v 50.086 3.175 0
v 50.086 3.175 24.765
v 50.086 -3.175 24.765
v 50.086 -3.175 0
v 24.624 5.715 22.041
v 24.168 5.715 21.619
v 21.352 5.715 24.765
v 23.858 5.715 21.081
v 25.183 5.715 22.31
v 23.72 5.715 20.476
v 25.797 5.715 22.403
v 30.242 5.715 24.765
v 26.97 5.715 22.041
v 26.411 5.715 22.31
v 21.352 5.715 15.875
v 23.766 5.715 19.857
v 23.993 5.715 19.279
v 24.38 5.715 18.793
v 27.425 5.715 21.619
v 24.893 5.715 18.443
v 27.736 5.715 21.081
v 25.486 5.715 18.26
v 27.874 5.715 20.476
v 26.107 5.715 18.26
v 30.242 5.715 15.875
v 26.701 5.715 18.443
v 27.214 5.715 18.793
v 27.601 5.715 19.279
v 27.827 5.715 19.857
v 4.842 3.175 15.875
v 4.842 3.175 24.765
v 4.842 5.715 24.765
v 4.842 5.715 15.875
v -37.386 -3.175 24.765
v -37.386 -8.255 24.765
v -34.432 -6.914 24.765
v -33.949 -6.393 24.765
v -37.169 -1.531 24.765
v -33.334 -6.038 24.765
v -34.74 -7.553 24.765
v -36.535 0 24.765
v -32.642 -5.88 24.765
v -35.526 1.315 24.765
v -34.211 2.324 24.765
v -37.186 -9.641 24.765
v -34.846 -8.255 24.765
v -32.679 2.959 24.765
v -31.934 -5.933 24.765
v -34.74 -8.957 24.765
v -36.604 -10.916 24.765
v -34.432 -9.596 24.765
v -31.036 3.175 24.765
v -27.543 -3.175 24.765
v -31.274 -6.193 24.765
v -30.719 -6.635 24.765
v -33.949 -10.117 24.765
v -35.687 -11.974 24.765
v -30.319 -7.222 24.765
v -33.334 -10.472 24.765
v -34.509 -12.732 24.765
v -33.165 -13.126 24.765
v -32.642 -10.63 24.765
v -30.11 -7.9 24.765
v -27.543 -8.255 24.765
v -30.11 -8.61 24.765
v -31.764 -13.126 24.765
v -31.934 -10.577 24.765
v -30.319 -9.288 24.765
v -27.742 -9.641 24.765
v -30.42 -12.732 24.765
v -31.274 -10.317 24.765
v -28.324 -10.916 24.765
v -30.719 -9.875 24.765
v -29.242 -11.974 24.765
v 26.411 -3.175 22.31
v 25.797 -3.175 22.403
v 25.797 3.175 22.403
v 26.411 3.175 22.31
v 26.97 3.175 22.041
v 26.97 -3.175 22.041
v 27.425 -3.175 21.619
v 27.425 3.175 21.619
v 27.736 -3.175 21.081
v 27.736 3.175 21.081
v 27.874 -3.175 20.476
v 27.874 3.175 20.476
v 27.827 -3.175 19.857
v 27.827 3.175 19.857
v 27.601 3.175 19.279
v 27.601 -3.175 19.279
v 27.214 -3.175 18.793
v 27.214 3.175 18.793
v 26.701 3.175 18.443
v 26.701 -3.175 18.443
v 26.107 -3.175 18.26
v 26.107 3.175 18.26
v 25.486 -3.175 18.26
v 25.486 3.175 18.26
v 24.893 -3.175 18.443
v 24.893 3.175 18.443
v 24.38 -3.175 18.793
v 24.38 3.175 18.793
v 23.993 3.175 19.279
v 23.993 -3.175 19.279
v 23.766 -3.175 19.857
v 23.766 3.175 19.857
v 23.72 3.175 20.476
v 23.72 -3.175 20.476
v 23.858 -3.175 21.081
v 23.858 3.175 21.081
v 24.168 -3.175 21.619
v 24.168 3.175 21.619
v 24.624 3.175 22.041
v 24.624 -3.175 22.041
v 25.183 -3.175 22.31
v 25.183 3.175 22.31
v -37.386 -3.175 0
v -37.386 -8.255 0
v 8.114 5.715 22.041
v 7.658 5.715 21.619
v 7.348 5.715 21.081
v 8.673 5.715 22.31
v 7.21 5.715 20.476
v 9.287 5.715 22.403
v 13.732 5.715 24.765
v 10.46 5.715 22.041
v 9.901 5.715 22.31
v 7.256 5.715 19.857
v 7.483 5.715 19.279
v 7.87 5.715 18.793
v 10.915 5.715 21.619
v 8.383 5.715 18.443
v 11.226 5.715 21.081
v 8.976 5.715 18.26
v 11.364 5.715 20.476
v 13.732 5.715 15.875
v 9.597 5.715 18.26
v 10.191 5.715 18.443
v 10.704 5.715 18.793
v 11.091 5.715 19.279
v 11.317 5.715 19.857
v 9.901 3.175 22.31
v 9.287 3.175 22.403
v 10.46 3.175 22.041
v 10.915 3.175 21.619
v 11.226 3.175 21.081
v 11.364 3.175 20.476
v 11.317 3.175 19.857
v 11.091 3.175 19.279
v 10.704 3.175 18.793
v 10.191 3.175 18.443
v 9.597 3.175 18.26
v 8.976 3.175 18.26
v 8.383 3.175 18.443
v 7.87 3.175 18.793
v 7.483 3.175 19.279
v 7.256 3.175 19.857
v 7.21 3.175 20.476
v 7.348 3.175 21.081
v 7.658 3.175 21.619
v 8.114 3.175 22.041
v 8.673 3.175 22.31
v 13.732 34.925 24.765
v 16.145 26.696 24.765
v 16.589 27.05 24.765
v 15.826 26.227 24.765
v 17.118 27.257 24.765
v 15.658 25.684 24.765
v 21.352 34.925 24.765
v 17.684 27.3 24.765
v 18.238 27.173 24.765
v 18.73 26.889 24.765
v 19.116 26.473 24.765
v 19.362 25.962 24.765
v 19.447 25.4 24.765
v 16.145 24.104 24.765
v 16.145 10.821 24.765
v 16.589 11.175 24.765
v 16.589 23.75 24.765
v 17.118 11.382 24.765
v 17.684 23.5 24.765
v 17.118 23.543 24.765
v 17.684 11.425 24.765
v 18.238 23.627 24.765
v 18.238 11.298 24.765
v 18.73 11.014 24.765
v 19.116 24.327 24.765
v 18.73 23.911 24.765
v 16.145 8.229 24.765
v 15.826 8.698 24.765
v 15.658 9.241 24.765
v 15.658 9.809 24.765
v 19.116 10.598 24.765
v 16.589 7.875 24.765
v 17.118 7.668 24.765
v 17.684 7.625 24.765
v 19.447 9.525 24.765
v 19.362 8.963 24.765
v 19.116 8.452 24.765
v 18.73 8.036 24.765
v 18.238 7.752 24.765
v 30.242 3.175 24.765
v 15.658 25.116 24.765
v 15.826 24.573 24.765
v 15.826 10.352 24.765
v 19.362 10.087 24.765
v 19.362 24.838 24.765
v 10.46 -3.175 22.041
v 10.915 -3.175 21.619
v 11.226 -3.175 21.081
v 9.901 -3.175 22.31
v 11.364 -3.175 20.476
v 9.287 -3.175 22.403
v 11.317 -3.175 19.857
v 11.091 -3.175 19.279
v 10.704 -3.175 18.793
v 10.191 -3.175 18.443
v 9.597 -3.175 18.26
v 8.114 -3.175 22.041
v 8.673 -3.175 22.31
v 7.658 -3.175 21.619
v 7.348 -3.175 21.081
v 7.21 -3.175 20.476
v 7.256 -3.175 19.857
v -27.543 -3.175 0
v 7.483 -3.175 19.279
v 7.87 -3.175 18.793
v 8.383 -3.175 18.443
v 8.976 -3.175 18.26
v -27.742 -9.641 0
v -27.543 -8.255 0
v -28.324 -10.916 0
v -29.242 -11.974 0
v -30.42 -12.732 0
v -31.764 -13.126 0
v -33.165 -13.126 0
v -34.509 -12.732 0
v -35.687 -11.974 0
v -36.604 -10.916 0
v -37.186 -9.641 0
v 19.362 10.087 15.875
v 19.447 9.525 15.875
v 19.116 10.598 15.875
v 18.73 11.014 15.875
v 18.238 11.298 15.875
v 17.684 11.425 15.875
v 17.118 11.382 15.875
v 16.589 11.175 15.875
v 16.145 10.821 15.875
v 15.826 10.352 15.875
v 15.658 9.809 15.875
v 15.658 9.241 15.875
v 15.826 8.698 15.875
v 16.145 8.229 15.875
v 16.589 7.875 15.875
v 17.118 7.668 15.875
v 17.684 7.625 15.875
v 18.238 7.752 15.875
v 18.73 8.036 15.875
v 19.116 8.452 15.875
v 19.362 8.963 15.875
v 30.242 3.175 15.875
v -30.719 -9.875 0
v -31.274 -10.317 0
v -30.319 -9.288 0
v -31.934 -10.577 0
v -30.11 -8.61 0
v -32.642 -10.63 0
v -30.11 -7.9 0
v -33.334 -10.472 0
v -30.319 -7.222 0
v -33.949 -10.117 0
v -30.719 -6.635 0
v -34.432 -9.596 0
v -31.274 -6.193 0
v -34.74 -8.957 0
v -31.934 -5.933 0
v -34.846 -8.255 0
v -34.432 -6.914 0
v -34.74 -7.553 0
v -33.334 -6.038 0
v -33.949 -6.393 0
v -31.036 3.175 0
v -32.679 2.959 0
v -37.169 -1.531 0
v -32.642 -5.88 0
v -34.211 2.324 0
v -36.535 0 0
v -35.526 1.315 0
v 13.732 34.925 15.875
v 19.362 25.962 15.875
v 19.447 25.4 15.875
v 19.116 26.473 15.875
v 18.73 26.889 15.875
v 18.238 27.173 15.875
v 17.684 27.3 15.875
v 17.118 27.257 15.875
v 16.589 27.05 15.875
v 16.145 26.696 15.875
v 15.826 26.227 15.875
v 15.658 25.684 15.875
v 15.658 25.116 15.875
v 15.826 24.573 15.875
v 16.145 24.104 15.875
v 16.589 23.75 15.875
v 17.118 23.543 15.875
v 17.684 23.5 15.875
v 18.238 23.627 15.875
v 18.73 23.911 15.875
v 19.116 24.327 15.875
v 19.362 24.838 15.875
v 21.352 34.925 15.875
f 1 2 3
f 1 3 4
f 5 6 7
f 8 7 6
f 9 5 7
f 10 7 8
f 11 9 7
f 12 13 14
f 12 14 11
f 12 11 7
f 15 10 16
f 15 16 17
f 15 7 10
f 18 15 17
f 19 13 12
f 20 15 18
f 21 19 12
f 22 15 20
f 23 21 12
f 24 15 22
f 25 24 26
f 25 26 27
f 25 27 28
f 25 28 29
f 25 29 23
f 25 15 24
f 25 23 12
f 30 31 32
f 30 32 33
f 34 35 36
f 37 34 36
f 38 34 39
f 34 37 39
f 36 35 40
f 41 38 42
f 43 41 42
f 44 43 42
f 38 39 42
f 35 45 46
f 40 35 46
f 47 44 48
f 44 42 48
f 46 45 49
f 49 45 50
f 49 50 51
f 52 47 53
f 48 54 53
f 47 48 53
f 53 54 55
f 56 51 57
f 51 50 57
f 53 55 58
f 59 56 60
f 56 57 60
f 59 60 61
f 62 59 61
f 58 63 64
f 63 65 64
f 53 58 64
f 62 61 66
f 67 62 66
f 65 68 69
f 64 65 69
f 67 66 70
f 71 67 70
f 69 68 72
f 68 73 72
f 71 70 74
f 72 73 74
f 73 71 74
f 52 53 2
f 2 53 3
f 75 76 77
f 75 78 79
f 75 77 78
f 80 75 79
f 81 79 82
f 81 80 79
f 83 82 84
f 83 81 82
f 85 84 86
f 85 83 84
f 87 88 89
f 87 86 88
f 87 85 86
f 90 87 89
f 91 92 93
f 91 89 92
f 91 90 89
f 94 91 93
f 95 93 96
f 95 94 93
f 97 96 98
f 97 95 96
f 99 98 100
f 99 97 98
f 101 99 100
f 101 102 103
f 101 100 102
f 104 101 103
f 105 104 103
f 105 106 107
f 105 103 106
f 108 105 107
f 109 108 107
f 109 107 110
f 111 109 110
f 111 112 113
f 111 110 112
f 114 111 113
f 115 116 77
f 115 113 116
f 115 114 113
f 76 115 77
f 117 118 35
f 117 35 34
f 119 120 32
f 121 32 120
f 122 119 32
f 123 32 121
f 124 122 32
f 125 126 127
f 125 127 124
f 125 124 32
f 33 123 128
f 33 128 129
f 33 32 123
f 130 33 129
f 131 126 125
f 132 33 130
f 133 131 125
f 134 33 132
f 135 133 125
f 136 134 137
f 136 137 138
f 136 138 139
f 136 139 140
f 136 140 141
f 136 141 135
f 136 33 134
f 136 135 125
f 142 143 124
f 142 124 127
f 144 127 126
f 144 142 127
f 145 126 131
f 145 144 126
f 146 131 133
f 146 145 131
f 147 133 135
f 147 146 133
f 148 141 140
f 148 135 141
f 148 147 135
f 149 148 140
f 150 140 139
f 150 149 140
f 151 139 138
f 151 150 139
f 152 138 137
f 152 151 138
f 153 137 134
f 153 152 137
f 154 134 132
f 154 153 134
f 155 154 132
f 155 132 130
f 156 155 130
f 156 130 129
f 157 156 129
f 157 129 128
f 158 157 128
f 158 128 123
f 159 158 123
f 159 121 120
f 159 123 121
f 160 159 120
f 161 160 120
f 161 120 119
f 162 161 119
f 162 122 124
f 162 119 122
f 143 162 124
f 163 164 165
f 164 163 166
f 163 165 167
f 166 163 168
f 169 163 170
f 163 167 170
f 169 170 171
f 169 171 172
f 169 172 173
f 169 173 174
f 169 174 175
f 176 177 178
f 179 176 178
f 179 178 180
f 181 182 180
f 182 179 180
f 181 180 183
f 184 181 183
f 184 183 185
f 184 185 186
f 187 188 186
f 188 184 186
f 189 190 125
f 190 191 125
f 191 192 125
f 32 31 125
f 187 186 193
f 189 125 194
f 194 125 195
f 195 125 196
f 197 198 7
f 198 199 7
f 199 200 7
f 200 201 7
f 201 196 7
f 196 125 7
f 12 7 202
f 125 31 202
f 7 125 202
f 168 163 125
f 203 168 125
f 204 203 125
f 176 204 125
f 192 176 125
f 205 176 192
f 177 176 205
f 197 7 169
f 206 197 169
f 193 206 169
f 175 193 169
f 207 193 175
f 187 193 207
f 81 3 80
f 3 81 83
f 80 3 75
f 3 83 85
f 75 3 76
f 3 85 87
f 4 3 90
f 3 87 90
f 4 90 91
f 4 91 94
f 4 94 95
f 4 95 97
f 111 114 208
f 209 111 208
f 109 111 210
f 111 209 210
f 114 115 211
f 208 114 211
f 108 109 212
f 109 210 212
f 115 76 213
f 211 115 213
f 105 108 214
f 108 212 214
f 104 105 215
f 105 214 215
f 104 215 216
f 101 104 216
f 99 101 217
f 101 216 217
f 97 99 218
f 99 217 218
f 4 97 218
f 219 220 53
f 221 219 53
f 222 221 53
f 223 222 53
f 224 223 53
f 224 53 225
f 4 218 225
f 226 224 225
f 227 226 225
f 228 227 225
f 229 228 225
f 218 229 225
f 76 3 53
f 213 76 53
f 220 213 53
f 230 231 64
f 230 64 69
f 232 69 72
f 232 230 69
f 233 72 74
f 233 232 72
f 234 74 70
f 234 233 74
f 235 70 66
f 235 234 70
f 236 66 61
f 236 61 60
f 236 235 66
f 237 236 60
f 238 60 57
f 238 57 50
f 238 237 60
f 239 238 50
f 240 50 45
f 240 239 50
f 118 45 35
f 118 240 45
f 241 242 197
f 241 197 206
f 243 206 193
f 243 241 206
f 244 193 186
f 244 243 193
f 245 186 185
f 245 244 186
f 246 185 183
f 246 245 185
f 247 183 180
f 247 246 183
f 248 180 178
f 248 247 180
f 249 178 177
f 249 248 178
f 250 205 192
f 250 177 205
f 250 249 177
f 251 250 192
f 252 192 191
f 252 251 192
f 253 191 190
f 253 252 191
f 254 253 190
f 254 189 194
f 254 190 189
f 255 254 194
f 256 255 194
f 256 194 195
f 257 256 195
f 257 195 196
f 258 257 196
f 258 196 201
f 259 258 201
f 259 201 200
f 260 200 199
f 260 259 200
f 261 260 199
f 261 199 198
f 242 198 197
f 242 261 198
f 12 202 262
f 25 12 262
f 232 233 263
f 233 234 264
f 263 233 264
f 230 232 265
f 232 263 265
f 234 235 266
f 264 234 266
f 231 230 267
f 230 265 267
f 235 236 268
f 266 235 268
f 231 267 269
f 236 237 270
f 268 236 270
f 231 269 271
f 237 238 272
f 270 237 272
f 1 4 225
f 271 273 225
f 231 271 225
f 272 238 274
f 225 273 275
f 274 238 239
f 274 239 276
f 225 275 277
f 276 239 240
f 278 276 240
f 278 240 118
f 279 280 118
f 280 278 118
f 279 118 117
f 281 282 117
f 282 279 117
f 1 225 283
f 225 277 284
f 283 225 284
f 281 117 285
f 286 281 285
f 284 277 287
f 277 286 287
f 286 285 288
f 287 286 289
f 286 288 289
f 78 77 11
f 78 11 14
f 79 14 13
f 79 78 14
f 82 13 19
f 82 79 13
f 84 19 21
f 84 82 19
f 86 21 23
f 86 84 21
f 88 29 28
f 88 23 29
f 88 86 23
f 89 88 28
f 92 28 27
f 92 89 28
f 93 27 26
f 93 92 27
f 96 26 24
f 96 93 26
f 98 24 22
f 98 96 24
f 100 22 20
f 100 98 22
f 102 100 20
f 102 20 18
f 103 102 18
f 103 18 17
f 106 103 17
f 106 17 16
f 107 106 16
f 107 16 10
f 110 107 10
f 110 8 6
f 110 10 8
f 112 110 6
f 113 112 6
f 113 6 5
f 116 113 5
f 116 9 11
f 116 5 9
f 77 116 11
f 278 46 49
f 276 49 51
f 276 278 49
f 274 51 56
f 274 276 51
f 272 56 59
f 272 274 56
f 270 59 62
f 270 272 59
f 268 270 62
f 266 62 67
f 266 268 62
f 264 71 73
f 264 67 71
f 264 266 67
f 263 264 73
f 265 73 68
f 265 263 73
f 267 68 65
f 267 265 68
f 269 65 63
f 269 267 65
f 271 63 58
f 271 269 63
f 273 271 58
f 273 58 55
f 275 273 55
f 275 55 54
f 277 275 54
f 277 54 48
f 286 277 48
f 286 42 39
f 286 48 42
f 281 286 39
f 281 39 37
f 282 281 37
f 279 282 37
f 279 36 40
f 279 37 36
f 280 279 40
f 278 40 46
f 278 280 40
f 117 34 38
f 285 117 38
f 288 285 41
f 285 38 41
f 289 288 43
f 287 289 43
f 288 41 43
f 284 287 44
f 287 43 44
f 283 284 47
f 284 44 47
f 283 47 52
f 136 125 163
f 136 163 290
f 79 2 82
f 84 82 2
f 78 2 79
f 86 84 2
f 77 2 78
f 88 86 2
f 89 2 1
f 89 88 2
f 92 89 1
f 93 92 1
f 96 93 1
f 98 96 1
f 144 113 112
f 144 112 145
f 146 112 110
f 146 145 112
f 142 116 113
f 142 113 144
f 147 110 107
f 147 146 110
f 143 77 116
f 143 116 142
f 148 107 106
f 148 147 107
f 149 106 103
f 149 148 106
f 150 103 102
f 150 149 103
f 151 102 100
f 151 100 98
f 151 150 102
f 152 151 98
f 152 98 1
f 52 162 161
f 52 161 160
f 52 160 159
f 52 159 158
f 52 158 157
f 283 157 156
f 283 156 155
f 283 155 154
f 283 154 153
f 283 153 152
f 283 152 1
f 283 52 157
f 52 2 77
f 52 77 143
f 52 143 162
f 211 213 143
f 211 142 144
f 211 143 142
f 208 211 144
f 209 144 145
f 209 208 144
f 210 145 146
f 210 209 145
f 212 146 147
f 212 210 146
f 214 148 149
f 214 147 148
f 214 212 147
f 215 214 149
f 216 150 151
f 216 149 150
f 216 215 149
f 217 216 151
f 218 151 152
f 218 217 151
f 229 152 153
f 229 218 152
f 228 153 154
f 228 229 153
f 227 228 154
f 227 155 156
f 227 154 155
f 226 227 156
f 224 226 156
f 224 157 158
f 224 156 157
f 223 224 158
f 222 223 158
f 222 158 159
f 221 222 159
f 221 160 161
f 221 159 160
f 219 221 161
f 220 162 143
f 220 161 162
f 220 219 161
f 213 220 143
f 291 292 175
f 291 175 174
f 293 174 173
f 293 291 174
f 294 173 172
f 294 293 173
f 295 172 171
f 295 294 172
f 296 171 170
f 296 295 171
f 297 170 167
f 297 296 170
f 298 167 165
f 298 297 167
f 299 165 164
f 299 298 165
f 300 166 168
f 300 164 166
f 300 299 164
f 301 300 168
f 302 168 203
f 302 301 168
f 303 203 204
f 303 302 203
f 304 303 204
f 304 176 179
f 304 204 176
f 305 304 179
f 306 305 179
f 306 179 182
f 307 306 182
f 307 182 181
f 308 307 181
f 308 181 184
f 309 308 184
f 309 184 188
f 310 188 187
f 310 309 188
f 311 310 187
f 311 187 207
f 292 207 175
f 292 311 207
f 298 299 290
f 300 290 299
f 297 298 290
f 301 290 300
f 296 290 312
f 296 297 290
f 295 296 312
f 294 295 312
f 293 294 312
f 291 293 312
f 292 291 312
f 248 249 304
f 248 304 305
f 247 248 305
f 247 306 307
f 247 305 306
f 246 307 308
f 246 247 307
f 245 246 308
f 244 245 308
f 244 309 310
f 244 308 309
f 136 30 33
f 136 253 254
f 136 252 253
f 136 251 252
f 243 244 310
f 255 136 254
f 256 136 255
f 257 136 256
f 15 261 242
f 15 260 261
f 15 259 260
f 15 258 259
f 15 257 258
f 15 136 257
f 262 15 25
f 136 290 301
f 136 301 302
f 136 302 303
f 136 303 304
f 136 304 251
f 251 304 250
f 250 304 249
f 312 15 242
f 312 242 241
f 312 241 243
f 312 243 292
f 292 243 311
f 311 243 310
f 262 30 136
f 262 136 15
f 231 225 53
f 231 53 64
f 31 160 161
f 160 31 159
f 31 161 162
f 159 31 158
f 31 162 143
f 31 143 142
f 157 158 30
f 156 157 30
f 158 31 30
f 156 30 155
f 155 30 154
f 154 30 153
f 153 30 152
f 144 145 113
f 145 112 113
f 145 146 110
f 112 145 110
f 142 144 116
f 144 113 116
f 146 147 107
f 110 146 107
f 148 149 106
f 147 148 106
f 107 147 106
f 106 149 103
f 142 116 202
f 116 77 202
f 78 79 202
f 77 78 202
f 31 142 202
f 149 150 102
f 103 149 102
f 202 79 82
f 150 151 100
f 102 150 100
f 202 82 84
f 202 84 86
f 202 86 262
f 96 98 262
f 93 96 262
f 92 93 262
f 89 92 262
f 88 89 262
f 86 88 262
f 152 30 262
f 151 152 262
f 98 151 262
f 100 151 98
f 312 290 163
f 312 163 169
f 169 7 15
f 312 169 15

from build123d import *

# Parameters (mm, degrees)
SKETCH1_R               = 2.38125
BOSS_EXTRUDE1_DEPTH     = 38.1
FILLET1_R               = 6.35
SKETCH3_W               = 38.1
SKETCH3_H               = 6.35
BOSS_EXTRUDE2_DEPTH     = 12.7
SKETCH2_W               = 7.62
SKETCH2_H               = 8.89
BOSS_EXTRUDE3_DEPTH     = 31.75
CUT_EXTRUDE1_DEPTH      = 66.891051605
CUT_EXTRUDE1_DEPTH_BACK = 66.891051605
SKETCH5_R               = 1.905
SKETCH6_W               = 25.4
SKETCH6_H               = 8.89
BOSS_EXTRUDE4_DEPTH     = 2.54
CUT_EXTRUDE2_DEPTH      = 70.378699409
CUT_EXTRUDE2_DEPTH_BACK = 70.378699409
SKETCH7_R               = 2.0828
CUT_EXTRUDE3_DEPTH      = 13.335


# Read off the part's stored shape, not the designer's step: Split1
with BuildPart() as part:
    # Sketch1 → Boss-Extrude1 (new body)
    with BuildSketch(Plane.XY):
        with BuildLine():
            Line((-37.385625, -8.255), (-37.385625, -3.175))
            Line((-37.385625, -3.175), (-37.385625, 3.175))
            Line((-37.385625, 3.175), (37.385625, 3.175))
            Line((37.385625, 3.175), (37.385625, -3.175))
            Line((37.385625, -3.175), (-27.543125, -3.175))
            Line((-27.543125, -3.175), (-27.543125, -8.255))
            ThreePointArc((-27.543125, -8.255), (-32.464375, -13.17625), (-37.385625, -8.255))
        make_face()
        with Locations(Location((-32.464375, -8.255, 0), (0, 0, 180))):
            Circle(SKETCH1_R, mode=Mode.SUBTRACT)
    extrude(amount=BOSS_EXTRUDE1_DEPTH)

    # Fillet1
    fillet1_edges = [part.edges().sort_by_distance(p)[0] for p in [
        (-37.385625, 3.175, 19.05),
    ]]
    fillet(fillet1_edges, radius=FILLET1_R)

    # Sketch3 → Boss-Extrude2 (add)
    with BuildSketch(Plane(origin=(37.385625, 0, 0), x_dir=(0, 0, -1), z_dir=(1, 0, 0))):
        with Locations((-19.05, 0)):
            Rectangle(SKETCH3_W, SKETCH3_H)
    extrude(amount=BOSS_EXTRUDE2_DEPTH)

    # Sketch2 → Boss-Extrude3 (add)
    with BuildSketch(Plane(origin=(0, 3.175, 0), x_dir=(1, 0, 0), z_dir=(0, 1, 0))):
        with Locations((17.541875, -20.32)):
            Rectangle(SKETCH2_W, SKETCH2_H)
    extrude(amount=BOSS_EXTRUDE3_DEPTH)

    # Sketch5 → Cut-Extrude1 (cut, two sides: drawn at the far end of the back side and taken through both)
    with BuildSketch(Plane.XY.offset(24.765).offset(-CUT_EXTRUDE1_DEPTH_BACK)):
        with Locations((17.541875, 9.525)):
            Circle(SKETCH5_R)
        with Locations((17.541875, 25.4)):
            Circle(SKETCH5_R)
    extrude(amount=CUT_EXTRUDE1_DEPTH + CUT_EXTRUDE1_DEPTH_BACK, mode=Mode.SUBTRACT)

    # Sketch6 → Boss-Extrude4 (add)
    with BuildSketch(Plane(origin=(0, 3.175, 0), x_dir=(1, 0, 0), z_dir=(0, 1, 0))):
        with Locations((17.541875, -20.32)):
            Rectangle(SKETCH6_W, SKETCH6_H)
    extrude(amount=BOSS_EXTRUDE4_DEPTH)

    # Sketch7 → Cut-Extrude2 (cut, two sides: drawn at the far end of the back side and taken through both)
    with BuildSketch(Plane(origin=(0, 5.715, 0), x_dir=(1, 0, 0), z_dir=(0, 1, 0)).offset(-CUT_EXTRUDE2_DEPTH_BACK)):
        with Locations(Location((9.286875, -20.32, 0), (0, 0, 270))):
            Circle(SKETCH7_R)
        with Locations(Location((25.796875, -20.32, 0), (0, 0, 270))):
            Circle(SKETCH7_R)
    extrude(amount=CUT_EXTRUDE2_DEPTH + CUT_EXTRUDE2_DEPTH_BACK, mode=Mode.SUBTRACT)

    # Sketch9 → Cut-Extrude3 (cut)
    with BuildSketch(Plane.XY.offset(38.1)):
        with BuildLine():
            Line((50.085625, 3.175), (50.085625, -3.175))
            Line((50.085625, -3.175), (-27.543125, -3.175))
            Line((-27.543125, -3.175), (-27.543125, -8.255))
            ThreePointArc((-27.543125, -8.255), (-32.464375, -13.17625), (-37.385625, -8.255))
            Line((-37.385625, -8.255), (-37.385625, -3.175))
            ThreePointArc((-37.385625, -3.175), (-35.525753061, 1.315128061), (-31.035625, 3.175))
            Line((-31.035625, 3.175), (50.085625, 3.175))
        make_face()
    extrude(amount=-CUT_EXTRUDE3_DEPTH, mode=Mode.SUBTRACT)


with BuildPart() as body_2:
    # Split1: the piece on the far side of the plane
    add(part.part)
    split(bisect_by=Plane(origin=(0, 3.175, 0), x_dir=(1, 0, 0), z_dir=(0, 1, 0)), keep=Keep.BOTTOM)


with BuildPart() as part_1:
    add(part.part)

    # Split1
    split(bisect_by=Plane(origin=(0, 3.175, 0), x_dir=(1, 0, 0), z_dir=(0, 1, 0)), keep=Keep.TOP)


solid = Compound([body_2.part, part_1.part])
